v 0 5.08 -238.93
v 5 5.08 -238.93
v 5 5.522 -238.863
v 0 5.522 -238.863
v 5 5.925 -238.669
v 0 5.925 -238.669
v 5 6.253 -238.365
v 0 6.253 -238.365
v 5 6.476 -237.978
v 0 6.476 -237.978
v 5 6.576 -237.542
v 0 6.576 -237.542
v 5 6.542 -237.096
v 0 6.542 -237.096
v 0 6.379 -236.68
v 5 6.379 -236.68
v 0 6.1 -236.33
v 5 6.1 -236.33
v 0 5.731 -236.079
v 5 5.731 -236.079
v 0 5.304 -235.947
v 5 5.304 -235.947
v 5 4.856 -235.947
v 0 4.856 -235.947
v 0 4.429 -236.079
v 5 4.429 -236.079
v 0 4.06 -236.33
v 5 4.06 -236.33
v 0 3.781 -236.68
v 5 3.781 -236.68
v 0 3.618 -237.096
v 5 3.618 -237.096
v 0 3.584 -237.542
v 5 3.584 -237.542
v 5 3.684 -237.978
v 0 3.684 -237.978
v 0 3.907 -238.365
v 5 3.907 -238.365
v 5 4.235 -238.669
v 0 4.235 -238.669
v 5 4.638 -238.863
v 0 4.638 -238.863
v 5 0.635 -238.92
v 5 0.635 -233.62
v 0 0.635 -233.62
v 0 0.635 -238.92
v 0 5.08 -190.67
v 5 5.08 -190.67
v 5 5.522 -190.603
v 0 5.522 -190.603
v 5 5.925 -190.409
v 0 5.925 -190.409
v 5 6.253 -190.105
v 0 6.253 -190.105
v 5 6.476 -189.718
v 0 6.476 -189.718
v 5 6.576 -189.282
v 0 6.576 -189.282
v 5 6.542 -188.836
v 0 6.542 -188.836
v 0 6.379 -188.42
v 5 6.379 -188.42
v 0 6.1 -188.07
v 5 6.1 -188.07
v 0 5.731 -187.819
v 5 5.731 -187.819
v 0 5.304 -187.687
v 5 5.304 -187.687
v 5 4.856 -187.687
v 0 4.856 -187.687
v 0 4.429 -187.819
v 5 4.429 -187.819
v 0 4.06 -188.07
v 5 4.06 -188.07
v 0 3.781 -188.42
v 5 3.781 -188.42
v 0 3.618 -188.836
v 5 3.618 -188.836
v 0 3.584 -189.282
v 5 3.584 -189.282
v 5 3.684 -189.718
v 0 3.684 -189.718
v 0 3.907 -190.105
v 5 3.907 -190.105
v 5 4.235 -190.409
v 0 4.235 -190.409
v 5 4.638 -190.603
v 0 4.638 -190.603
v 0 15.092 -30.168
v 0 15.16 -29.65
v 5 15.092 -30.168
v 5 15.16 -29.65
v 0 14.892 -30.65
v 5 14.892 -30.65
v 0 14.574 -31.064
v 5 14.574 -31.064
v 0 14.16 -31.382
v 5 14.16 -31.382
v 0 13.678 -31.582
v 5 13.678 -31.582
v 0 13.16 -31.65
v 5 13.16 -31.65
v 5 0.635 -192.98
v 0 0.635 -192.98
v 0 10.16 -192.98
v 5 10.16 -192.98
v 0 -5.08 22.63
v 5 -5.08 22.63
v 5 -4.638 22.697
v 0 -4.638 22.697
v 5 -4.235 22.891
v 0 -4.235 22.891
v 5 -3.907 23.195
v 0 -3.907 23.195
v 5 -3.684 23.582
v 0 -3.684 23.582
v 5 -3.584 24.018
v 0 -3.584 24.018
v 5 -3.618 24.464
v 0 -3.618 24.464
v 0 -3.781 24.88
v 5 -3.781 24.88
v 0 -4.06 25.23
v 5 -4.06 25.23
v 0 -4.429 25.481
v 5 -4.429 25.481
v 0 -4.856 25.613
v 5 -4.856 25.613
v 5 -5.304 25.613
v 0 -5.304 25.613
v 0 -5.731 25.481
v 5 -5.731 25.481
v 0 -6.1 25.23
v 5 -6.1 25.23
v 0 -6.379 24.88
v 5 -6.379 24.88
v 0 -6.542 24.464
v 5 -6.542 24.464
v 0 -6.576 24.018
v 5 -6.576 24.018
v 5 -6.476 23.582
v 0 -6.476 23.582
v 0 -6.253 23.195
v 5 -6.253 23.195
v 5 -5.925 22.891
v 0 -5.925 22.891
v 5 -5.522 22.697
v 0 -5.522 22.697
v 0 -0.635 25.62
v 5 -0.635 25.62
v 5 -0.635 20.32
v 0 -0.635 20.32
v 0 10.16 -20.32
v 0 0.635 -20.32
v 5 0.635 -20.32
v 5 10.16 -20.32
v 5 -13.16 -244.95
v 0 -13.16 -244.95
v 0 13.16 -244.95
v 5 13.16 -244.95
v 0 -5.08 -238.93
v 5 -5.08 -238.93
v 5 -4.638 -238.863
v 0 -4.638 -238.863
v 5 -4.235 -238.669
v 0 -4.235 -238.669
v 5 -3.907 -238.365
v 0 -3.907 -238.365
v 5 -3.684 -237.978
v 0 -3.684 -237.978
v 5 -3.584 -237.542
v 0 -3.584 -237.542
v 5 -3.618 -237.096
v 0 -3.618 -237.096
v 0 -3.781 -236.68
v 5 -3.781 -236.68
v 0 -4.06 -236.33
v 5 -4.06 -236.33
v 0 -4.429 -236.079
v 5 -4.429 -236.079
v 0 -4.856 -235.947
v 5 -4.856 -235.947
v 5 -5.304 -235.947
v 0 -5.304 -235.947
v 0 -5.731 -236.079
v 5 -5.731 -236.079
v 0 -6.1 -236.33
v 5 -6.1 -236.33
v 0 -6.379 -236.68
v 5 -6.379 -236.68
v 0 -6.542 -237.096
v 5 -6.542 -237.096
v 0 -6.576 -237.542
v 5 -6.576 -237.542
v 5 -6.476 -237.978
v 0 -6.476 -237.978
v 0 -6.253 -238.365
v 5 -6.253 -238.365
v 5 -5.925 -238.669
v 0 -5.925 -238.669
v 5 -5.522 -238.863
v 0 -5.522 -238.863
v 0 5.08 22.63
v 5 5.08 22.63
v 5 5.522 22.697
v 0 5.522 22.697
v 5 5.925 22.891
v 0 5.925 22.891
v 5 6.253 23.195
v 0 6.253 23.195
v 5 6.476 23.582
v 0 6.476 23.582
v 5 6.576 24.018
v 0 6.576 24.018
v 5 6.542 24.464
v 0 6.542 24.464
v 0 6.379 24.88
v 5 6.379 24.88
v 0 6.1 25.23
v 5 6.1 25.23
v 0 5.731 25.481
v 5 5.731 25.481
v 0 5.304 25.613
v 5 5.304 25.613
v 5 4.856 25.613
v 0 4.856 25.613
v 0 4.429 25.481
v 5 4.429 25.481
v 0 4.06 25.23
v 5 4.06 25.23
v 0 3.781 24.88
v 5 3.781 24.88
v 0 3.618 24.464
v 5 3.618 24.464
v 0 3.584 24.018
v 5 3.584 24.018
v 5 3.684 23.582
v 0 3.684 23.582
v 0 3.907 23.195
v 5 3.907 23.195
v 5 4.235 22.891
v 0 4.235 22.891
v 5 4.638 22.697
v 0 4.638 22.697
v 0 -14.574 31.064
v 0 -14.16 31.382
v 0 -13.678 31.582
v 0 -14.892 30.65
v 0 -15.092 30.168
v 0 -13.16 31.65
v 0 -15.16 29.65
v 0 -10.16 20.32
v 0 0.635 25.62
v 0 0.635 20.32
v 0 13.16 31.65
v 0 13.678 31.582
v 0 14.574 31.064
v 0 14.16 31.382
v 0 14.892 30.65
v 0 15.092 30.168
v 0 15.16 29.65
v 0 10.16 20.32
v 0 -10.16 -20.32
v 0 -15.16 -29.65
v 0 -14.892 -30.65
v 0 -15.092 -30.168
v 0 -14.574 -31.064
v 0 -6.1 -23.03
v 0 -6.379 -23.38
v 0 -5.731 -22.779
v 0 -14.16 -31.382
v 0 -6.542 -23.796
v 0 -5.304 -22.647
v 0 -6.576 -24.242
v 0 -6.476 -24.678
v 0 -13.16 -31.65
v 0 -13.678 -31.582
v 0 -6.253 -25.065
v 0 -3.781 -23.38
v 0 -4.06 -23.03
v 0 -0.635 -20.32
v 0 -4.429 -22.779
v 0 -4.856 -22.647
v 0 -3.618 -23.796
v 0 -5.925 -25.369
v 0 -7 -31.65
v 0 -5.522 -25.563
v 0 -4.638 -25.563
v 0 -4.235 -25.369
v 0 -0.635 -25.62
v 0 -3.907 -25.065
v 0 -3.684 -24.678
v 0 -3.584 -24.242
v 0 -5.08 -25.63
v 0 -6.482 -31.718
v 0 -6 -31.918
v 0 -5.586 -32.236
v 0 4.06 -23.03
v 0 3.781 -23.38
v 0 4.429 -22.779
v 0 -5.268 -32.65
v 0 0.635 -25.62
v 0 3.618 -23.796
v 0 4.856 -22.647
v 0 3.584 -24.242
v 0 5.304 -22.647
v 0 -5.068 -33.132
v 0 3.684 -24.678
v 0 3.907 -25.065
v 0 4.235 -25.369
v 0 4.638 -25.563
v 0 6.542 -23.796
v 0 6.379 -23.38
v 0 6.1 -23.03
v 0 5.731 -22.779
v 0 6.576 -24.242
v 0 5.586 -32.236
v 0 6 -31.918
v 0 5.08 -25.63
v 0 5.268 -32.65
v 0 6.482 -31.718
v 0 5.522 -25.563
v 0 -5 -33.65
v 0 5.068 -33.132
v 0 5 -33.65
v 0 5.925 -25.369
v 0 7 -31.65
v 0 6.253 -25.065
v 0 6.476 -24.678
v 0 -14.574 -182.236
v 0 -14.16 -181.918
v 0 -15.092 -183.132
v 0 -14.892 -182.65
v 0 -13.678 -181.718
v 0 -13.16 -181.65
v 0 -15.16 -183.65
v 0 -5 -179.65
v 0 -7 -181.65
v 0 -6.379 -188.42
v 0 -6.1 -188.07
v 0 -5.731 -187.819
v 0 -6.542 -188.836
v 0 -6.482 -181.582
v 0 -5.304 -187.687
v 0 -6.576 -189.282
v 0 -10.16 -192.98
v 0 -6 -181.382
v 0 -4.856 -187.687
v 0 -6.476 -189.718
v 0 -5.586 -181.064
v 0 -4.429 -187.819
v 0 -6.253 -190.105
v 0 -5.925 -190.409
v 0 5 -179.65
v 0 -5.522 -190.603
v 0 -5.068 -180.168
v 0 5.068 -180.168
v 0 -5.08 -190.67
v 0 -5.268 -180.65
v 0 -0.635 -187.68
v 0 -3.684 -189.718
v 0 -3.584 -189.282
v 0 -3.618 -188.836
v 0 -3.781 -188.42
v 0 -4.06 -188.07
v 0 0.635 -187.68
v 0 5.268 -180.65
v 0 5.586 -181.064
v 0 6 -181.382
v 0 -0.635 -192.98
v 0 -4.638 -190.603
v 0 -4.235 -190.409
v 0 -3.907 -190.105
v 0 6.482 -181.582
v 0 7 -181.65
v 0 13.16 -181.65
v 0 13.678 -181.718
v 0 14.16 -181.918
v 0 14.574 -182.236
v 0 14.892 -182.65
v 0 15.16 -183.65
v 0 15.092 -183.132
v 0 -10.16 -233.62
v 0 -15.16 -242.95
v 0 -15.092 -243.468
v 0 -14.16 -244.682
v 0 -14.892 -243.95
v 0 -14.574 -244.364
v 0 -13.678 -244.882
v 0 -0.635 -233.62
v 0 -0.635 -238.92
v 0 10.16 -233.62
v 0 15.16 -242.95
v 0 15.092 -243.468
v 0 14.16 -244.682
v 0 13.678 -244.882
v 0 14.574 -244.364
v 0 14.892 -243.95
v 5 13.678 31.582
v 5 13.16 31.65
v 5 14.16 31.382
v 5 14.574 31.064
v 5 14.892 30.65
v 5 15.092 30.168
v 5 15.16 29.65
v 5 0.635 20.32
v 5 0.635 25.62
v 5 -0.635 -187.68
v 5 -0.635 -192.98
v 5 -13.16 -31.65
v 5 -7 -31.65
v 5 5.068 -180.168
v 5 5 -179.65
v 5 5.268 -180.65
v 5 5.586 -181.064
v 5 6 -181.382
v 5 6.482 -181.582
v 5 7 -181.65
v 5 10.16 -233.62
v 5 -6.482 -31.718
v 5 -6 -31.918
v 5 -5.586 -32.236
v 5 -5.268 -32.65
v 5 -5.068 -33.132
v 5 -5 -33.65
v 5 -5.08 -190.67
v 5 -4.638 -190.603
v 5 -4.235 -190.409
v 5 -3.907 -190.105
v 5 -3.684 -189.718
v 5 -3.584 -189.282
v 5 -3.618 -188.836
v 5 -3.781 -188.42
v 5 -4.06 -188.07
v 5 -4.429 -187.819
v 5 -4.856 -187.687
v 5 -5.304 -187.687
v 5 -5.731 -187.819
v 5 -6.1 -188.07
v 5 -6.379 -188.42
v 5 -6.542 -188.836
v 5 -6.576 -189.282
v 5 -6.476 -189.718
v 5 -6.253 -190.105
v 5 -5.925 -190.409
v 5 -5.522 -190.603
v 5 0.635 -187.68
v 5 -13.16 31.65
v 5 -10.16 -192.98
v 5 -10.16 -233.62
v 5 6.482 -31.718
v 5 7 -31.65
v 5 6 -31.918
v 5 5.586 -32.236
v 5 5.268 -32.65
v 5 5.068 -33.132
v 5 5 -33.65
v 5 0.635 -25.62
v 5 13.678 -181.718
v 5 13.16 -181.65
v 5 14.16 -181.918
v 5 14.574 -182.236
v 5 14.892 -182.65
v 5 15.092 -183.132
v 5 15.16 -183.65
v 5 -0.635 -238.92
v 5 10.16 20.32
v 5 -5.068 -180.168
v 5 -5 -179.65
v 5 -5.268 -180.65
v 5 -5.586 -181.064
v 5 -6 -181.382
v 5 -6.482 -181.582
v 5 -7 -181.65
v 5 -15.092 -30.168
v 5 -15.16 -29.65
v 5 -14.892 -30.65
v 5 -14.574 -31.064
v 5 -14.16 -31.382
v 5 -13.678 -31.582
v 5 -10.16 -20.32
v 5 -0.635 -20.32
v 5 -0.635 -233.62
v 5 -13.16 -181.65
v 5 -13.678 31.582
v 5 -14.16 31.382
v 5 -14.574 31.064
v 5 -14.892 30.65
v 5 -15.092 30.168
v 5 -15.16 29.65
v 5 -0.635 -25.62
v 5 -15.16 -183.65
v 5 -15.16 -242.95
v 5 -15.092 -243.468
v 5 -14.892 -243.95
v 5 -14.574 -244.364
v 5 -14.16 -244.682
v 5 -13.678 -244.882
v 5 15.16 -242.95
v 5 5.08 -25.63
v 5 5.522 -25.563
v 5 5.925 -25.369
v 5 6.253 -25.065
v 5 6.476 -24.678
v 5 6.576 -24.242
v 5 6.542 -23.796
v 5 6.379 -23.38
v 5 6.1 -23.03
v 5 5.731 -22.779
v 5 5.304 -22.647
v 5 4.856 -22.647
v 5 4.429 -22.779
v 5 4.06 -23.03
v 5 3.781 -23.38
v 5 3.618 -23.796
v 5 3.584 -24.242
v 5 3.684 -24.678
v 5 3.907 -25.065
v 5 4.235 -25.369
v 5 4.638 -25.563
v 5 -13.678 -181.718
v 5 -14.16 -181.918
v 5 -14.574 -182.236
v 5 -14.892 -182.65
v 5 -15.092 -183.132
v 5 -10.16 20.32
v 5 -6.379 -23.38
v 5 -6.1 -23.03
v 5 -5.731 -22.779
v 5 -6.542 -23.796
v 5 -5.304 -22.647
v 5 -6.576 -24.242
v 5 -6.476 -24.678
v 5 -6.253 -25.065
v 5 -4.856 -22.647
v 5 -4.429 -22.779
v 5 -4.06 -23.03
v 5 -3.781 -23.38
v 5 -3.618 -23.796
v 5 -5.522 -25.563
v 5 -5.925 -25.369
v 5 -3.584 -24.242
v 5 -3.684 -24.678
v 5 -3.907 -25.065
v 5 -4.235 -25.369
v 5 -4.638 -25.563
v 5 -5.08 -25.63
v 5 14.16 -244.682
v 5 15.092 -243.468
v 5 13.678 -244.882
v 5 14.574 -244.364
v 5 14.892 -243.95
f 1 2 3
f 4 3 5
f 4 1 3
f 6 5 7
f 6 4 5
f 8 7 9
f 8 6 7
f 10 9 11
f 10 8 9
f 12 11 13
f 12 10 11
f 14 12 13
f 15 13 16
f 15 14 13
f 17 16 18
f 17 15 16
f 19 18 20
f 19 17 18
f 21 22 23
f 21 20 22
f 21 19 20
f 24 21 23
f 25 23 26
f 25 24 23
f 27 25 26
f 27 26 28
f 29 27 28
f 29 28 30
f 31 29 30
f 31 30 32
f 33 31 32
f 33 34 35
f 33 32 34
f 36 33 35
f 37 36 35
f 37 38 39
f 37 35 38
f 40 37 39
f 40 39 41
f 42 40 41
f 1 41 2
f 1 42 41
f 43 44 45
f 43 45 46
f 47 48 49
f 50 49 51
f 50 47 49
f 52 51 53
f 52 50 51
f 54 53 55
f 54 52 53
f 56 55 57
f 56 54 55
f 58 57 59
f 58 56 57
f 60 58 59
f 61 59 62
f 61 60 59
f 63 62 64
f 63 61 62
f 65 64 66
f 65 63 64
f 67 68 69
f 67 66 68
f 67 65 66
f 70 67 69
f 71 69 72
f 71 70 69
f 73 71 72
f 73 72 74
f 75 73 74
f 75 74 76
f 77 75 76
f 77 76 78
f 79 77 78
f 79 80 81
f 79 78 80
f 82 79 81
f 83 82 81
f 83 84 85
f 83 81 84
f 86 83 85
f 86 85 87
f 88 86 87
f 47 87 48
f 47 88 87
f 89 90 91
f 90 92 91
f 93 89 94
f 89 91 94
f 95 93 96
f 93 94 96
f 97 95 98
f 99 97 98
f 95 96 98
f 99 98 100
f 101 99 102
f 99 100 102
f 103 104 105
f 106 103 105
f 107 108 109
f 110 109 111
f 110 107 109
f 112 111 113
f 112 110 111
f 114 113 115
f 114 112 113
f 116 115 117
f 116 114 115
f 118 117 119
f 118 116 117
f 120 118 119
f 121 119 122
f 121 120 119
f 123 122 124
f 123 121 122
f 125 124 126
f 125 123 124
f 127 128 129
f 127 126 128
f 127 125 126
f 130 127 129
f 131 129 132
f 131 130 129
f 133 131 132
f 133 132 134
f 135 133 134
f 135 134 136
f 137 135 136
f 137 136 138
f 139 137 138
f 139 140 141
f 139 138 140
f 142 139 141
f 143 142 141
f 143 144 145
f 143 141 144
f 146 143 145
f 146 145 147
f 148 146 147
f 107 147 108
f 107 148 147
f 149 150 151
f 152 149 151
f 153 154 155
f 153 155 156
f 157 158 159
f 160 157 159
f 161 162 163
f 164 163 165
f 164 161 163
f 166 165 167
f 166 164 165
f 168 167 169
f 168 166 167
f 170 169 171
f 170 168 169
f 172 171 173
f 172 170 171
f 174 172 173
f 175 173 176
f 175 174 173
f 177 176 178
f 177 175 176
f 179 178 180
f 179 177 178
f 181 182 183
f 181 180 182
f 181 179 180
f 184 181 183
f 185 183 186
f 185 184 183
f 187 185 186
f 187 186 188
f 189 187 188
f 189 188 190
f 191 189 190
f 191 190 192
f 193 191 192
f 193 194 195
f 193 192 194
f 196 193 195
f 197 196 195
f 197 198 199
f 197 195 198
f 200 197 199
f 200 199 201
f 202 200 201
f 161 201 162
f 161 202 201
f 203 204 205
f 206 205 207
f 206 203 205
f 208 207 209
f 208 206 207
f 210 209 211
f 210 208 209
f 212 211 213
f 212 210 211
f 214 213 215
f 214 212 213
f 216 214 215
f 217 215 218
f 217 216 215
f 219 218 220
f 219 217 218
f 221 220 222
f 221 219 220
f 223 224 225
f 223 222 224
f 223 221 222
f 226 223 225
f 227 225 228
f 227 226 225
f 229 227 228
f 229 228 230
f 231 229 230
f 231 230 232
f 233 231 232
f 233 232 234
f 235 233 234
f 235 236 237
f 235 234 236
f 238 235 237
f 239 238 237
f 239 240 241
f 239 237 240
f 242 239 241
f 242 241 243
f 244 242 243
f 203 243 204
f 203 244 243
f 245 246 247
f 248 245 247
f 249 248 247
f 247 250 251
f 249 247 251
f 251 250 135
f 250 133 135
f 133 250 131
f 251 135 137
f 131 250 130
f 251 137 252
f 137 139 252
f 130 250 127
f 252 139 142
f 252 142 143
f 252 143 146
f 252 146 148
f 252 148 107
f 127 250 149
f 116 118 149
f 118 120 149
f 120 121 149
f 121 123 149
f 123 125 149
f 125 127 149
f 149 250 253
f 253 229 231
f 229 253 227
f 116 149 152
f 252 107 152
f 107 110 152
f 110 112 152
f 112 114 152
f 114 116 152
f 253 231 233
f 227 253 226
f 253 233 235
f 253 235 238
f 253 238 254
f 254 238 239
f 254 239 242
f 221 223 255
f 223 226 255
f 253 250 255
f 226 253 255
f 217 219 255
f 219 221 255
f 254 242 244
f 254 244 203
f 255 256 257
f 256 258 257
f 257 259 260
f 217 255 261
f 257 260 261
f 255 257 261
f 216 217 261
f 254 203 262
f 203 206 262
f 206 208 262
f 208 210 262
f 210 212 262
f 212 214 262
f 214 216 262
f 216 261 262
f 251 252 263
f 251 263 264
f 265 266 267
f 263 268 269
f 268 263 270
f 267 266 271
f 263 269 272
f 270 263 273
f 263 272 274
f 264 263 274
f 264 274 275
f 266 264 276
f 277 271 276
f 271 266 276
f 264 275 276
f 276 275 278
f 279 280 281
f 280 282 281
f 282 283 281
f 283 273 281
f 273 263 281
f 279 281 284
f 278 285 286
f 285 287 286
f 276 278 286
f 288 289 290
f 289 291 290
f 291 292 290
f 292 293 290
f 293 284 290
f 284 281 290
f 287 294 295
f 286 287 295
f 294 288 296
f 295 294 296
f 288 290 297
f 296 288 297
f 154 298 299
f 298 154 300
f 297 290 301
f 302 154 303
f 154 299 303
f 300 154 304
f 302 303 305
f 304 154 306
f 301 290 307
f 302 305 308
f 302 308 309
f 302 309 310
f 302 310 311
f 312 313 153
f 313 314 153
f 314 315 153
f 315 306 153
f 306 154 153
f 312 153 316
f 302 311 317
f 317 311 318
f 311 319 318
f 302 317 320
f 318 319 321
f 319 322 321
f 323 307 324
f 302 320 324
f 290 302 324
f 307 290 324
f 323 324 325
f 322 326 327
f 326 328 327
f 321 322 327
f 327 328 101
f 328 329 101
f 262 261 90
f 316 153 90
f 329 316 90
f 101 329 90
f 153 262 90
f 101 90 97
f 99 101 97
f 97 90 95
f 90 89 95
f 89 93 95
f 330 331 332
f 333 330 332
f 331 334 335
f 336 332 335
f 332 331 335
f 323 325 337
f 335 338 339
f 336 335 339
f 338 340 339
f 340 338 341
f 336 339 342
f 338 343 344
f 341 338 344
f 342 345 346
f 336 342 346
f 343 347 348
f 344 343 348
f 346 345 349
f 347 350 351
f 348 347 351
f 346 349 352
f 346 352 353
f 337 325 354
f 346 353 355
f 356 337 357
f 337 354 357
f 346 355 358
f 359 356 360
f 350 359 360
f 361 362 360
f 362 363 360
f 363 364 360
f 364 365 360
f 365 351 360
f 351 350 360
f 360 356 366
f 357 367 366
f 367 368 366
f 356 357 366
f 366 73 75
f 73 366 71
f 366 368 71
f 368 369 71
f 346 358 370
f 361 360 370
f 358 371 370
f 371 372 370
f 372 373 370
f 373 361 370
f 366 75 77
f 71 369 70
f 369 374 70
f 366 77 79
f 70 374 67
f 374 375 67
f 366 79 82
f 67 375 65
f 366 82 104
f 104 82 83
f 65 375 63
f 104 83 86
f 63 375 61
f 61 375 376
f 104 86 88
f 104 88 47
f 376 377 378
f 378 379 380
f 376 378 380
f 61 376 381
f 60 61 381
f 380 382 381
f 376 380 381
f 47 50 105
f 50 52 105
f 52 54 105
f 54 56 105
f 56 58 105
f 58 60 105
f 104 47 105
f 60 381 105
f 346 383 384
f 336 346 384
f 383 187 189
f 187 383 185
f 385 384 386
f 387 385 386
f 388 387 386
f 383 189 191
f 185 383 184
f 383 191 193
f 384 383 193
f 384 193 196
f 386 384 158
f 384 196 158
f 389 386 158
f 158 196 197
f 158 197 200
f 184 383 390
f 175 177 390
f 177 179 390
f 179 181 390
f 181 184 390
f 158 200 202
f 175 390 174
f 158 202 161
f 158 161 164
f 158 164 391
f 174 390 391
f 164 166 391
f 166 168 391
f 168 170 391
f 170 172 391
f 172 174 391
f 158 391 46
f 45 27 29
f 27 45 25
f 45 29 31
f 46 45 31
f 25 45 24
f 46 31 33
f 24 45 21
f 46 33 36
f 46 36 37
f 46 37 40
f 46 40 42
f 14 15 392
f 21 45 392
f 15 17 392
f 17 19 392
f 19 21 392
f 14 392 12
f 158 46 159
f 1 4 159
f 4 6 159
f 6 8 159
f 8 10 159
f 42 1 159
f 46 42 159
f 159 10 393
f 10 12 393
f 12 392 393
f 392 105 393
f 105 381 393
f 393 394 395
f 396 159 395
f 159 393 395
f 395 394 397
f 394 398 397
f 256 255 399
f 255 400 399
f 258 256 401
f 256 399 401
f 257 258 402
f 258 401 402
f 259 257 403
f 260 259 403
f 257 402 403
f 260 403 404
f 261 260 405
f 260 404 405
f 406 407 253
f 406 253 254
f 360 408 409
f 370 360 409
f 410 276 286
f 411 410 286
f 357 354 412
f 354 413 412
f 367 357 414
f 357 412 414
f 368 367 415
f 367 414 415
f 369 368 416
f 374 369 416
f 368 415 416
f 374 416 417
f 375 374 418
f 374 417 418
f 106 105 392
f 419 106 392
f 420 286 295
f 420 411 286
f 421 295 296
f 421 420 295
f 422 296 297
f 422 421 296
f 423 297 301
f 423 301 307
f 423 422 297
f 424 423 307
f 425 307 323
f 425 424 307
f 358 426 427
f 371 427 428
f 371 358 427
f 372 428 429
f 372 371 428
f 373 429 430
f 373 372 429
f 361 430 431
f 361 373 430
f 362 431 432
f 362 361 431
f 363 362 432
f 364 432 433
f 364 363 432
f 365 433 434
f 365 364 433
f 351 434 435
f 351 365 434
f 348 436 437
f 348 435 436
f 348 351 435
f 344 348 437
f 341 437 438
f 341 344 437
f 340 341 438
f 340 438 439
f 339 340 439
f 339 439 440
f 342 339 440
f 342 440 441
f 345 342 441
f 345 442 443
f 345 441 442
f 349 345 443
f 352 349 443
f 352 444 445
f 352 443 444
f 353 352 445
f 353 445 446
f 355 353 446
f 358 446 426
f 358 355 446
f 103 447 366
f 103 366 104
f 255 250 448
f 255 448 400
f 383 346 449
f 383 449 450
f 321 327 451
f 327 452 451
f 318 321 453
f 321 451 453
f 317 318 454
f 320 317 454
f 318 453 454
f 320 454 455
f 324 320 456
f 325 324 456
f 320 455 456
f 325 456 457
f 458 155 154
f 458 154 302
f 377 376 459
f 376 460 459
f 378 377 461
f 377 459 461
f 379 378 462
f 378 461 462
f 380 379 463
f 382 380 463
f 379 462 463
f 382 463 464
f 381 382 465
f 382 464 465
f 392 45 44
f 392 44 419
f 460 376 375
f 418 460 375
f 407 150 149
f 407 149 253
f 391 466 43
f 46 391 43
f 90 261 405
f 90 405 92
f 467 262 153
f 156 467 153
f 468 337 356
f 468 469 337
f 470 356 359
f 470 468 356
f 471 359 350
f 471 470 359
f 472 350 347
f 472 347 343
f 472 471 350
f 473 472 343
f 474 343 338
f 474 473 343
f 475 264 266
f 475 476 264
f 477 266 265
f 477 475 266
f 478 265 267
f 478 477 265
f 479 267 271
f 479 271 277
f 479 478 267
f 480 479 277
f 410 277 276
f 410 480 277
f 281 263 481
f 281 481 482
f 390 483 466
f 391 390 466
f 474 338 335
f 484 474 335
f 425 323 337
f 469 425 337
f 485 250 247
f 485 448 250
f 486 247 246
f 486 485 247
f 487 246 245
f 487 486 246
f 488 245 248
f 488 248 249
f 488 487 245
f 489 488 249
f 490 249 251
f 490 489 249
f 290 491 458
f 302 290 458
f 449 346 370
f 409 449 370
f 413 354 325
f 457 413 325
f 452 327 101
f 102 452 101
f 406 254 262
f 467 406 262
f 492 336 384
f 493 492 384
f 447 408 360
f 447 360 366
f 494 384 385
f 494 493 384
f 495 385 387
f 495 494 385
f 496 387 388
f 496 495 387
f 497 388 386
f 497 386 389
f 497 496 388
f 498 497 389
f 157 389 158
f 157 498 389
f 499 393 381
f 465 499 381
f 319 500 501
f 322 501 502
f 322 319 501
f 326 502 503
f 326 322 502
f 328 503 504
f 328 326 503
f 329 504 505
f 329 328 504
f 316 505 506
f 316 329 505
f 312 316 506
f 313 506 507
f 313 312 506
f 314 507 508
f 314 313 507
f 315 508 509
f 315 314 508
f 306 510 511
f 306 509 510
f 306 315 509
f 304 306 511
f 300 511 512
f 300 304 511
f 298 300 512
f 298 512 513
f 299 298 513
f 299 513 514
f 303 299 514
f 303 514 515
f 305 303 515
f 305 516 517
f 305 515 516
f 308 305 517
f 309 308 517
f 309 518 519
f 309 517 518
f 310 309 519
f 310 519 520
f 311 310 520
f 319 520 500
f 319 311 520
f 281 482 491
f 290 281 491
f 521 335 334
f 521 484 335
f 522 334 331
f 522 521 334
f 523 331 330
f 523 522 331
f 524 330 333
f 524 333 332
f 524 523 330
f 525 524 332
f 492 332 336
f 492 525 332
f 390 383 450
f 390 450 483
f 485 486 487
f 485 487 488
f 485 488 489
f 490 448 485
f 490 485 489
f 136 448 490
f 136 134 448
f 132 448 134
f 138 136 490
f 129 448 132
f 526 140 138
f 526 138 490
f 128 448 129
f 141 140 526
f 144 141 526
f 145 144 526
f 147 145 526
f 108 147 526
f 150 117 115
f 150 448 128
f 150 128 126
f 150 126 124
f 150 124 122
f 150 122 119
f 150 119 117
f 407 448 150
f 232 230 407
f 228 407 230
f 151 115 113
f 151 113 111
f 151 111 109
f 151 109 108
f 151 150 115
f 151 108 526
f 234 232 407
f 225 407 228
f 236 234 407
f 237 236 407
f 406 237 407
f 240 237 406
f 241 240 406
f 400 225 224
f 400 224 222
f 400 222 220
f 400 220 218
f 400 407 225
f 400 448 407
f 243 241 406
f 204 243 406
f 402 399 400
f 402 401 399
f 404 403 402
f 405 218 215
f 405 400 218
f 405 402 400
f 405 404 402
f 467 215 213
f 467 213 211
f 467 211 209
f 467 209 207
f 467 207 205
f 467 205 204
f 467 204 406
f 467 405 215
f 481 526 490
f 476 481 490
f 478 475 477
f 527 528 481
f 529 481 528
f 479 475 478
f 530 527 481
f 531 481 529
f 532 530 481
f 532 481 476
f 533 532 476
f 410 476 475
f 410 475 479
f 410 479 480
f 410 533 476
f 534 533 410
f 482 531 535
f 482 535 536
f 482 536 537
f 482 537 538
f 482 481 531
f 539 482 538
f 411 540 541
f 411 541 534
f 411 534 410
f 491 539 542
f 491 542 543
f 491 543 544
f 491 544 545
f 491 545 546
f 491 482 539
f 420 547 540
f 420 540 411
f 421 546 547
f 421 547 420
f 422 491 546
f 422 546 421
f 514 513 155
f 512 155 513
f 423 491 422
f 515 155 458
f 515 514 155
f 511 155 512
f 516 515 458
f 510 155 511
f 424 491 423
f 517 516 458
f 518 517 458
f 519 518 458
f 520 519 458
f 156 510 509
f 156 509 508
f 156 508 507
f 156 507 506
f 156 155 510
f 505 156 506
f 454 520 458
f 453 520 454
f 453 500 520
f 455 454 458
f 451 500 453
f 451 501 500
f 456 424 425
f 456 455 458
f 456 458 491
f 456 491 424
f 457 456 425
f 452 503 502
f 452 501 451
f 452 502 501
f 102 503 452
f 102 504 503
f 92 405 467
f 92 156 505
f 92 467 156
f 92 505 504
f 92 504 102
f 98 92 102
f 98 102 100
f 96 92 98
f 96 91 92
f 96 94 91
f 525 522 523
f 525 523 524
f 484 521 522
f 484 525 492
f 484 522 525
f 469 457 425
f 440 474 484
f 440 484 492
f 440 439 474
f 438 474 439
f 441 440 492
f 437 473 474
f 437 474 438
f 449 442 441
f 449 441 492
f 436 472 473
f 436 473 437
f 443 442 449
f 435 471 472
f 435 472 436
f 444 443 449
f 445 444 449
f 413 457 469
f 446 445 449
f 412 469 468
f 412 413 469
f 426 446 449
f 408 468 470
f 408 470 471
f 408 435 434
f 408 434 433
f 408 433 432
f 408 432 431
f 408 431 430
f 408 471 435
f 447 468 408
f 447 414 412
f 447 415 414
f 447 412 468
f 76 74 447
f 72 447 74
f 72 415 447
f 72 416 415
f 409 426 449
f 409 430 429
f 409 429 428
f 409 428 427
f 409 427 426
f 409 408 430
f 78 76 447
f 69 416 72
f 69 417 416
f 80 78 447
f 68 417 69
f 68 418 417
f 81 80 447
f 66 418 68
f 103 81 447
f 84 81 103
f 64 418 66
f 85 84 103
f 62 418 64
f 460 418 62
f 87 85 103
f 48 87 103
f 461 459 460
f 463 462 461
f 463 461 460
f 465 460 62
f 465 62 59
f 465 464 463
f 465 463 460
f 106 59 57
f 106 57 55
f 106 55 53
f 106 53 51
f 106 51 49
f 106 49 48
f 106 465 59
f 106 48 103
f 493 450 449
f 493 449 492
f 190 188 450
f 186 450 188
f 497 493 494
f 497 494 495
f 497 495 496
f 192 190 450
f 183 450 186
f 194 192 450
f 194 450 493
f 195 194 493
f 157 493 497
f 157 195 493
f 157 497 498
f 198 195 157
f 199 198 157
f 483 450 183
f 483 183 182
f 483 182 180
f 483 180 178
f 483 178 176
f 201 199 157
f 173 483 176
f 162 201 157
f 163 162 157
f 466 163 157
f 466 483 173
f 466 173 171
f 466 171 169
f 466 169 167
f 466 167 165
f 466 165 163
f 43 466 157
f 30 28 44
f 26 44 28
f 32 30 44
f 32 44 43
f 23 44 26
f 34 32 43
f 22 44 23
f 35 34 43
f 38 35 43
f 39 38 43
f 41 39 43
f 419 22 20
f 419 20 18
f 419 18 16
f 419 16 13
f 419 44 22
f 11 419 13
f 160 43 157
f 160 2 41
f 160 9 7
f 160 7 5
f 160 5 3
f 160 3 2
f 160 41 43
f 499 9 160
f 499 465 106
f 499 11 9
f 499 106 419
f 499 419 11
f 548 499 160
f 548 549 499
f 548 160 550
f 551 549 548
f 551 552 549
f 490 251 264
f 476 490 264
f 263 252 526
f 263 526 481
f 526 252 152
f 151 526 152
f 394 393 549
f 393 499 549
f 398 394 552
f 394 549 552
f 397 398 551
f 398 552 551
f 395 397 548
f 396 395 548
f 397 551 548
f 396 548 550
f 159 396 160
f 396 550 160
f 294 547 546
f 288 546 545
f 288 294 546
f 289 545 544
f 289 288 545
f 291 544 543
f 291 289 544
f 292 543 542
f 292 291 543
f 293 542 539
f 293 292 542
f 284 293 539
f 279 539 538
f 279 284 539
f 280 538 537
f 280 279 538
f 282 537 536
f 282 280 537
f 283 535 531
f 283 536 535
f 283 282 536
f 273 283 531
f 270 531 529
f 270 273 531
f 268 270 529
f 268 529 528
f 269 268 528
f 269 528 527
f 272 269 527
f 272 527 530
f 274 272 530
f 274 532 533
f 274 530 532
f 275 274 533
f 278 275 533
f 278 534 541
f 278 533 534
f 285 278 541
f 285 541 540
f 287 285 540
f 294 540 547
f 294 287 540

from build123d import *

# Parameters (mm, degrees)
BOSS_EXTRUDE1_DEPTH = 5
SKETCH1_R           = 1.5
SKETCH1_W           = 40.64
SKETCH1_H           = 20.32
CUT_EXTRUDE7_DEPTH  = 246.469607284
FILLET1_R           = 2
SKETCH4_W           = 5.3
SKETCH4_H           = 1.27
CUT_EXTRUDE8_DEPTH  = 246.469607284
SKETCH5_W           = 5.3
SKETCH5_H           = 1.27
CUT_EXTRUDE9_DEPTH  = 246.469607284


with BuildPart() as part:
    # Sketch2 → Boss-Extrude1 (new body)
    with BuildSketch(Plane(origin=(0, 0, 0), x_dir=(0, 0, -1), z_dir=(1, 0, 0))):
        Polygon((31.65, -15.16), (31.65, -5), (181.65, -5), (181.65, -15.16), (244.95, -15.16), (244.95, 15.16), (181.65, 15.16), (181.65, 5), (31.65, 5), (31.65, 15.16), (-31.65, 15.16), (-31.65, -15.16), align=None)
    extrude(amount=BOSS_EXTRUDE1_DEPTH)

    # Sketch1 → Cut-Extrude7 (cut, through all)
    with BuildSketch(Plane(origin=(0, 0, 0), x_dir=(0, 0, -1), z_dir=(1, 0, 0))):
        with Locations((-24.13, 5.08)):
            Circle(SKETCH1_R)
        with Locations((-24.13, -5.08)):
            Circle(SKETCH1_R)
        with Locations((24.13, 5.08)):
            Circle(SKETCH1_R)
        with Locations((24.13, -5.08)):
            Circle(SKETCH1_R)
        with Locations((189.17, -5.08)):
            Circle(SKETCH1_R)
        with Locations((189.17, 5.08)):
            Circle(SKETCH1_R)
        with Locations((237.43, -5.08)):
            Circle(SKETCH1_R)
        with Locations((237.43, 5.08)):
            Circle(SKETCH1_R)
        Rectangle(SKETCH1_W, SKETCH1_H)
        with Locations((213.3, 0)):
            Rectangle(SKETCH1_W, SKETCH1_H)
    extrude(amount=CUT_EXTRUDE7_DEPTH, mode=Mode.SUBTRACT)

    # Fillet1
    fillet1_edges = [part.edges().sort_by_distance(p)[0] for p in [
        (2.5, 15.16, 31.65),
        (2.5, 15.16, -31.65),
        (2.5, 5, -31.65),
        (2.5, -15.16, -31.65),
        (2.5, -5, -31.65),
        (2.5, -15.16, 31.65),
        (2.5, -5, -181.65),
        (2.5, -15.16, -181.65),
        (2.5, -15.16, -244.95),
        (2.5, 15.16, -244.95),
        (2.5, 5, -181.65),
        (2.5, 15.16, -181.65),
    ]]
    fillet(fillet1_edges, radius=FILLET1_R)

    # Sketch4 → Cut-Extrude8 (cut, through all)
    with BuildSketch(Plane(origin=(5, 0, 0), x_dir=(0, 0, -1), z_dir=(1, 0, 0))):
        with Locations((-22.97, 0)):
            Rectangle(SKETCH4_W, SKETCH4_H)
        with Locations((22.97, 0)):
            Rectangle(SKETCH4_W, SKETCH4_H)
    extrude(amount=-CUT_EXTRUDE8_DEPTH, mode=Mode.SUBTRACT)

    # Sketch5 → Cut-Extrude9 (cut, through all)
    with BuildSketch(Plane(origin=(5, 0, 0), x_dir=(0, 0, -1), z_dir=(1, 0, 0))):
        with Locations((236.27, 0)):
            Rectangle(SKETCH5_W, SKETCH5_H)
        with Locations((190.33, 0)):
            Rectangle(SKETCH5_W, SKETCH5_H)
    extrude(amount=-CUT_EXTRUDE9_DEPTH, mode=Mode.SUBTRACT)


solid = part.part
